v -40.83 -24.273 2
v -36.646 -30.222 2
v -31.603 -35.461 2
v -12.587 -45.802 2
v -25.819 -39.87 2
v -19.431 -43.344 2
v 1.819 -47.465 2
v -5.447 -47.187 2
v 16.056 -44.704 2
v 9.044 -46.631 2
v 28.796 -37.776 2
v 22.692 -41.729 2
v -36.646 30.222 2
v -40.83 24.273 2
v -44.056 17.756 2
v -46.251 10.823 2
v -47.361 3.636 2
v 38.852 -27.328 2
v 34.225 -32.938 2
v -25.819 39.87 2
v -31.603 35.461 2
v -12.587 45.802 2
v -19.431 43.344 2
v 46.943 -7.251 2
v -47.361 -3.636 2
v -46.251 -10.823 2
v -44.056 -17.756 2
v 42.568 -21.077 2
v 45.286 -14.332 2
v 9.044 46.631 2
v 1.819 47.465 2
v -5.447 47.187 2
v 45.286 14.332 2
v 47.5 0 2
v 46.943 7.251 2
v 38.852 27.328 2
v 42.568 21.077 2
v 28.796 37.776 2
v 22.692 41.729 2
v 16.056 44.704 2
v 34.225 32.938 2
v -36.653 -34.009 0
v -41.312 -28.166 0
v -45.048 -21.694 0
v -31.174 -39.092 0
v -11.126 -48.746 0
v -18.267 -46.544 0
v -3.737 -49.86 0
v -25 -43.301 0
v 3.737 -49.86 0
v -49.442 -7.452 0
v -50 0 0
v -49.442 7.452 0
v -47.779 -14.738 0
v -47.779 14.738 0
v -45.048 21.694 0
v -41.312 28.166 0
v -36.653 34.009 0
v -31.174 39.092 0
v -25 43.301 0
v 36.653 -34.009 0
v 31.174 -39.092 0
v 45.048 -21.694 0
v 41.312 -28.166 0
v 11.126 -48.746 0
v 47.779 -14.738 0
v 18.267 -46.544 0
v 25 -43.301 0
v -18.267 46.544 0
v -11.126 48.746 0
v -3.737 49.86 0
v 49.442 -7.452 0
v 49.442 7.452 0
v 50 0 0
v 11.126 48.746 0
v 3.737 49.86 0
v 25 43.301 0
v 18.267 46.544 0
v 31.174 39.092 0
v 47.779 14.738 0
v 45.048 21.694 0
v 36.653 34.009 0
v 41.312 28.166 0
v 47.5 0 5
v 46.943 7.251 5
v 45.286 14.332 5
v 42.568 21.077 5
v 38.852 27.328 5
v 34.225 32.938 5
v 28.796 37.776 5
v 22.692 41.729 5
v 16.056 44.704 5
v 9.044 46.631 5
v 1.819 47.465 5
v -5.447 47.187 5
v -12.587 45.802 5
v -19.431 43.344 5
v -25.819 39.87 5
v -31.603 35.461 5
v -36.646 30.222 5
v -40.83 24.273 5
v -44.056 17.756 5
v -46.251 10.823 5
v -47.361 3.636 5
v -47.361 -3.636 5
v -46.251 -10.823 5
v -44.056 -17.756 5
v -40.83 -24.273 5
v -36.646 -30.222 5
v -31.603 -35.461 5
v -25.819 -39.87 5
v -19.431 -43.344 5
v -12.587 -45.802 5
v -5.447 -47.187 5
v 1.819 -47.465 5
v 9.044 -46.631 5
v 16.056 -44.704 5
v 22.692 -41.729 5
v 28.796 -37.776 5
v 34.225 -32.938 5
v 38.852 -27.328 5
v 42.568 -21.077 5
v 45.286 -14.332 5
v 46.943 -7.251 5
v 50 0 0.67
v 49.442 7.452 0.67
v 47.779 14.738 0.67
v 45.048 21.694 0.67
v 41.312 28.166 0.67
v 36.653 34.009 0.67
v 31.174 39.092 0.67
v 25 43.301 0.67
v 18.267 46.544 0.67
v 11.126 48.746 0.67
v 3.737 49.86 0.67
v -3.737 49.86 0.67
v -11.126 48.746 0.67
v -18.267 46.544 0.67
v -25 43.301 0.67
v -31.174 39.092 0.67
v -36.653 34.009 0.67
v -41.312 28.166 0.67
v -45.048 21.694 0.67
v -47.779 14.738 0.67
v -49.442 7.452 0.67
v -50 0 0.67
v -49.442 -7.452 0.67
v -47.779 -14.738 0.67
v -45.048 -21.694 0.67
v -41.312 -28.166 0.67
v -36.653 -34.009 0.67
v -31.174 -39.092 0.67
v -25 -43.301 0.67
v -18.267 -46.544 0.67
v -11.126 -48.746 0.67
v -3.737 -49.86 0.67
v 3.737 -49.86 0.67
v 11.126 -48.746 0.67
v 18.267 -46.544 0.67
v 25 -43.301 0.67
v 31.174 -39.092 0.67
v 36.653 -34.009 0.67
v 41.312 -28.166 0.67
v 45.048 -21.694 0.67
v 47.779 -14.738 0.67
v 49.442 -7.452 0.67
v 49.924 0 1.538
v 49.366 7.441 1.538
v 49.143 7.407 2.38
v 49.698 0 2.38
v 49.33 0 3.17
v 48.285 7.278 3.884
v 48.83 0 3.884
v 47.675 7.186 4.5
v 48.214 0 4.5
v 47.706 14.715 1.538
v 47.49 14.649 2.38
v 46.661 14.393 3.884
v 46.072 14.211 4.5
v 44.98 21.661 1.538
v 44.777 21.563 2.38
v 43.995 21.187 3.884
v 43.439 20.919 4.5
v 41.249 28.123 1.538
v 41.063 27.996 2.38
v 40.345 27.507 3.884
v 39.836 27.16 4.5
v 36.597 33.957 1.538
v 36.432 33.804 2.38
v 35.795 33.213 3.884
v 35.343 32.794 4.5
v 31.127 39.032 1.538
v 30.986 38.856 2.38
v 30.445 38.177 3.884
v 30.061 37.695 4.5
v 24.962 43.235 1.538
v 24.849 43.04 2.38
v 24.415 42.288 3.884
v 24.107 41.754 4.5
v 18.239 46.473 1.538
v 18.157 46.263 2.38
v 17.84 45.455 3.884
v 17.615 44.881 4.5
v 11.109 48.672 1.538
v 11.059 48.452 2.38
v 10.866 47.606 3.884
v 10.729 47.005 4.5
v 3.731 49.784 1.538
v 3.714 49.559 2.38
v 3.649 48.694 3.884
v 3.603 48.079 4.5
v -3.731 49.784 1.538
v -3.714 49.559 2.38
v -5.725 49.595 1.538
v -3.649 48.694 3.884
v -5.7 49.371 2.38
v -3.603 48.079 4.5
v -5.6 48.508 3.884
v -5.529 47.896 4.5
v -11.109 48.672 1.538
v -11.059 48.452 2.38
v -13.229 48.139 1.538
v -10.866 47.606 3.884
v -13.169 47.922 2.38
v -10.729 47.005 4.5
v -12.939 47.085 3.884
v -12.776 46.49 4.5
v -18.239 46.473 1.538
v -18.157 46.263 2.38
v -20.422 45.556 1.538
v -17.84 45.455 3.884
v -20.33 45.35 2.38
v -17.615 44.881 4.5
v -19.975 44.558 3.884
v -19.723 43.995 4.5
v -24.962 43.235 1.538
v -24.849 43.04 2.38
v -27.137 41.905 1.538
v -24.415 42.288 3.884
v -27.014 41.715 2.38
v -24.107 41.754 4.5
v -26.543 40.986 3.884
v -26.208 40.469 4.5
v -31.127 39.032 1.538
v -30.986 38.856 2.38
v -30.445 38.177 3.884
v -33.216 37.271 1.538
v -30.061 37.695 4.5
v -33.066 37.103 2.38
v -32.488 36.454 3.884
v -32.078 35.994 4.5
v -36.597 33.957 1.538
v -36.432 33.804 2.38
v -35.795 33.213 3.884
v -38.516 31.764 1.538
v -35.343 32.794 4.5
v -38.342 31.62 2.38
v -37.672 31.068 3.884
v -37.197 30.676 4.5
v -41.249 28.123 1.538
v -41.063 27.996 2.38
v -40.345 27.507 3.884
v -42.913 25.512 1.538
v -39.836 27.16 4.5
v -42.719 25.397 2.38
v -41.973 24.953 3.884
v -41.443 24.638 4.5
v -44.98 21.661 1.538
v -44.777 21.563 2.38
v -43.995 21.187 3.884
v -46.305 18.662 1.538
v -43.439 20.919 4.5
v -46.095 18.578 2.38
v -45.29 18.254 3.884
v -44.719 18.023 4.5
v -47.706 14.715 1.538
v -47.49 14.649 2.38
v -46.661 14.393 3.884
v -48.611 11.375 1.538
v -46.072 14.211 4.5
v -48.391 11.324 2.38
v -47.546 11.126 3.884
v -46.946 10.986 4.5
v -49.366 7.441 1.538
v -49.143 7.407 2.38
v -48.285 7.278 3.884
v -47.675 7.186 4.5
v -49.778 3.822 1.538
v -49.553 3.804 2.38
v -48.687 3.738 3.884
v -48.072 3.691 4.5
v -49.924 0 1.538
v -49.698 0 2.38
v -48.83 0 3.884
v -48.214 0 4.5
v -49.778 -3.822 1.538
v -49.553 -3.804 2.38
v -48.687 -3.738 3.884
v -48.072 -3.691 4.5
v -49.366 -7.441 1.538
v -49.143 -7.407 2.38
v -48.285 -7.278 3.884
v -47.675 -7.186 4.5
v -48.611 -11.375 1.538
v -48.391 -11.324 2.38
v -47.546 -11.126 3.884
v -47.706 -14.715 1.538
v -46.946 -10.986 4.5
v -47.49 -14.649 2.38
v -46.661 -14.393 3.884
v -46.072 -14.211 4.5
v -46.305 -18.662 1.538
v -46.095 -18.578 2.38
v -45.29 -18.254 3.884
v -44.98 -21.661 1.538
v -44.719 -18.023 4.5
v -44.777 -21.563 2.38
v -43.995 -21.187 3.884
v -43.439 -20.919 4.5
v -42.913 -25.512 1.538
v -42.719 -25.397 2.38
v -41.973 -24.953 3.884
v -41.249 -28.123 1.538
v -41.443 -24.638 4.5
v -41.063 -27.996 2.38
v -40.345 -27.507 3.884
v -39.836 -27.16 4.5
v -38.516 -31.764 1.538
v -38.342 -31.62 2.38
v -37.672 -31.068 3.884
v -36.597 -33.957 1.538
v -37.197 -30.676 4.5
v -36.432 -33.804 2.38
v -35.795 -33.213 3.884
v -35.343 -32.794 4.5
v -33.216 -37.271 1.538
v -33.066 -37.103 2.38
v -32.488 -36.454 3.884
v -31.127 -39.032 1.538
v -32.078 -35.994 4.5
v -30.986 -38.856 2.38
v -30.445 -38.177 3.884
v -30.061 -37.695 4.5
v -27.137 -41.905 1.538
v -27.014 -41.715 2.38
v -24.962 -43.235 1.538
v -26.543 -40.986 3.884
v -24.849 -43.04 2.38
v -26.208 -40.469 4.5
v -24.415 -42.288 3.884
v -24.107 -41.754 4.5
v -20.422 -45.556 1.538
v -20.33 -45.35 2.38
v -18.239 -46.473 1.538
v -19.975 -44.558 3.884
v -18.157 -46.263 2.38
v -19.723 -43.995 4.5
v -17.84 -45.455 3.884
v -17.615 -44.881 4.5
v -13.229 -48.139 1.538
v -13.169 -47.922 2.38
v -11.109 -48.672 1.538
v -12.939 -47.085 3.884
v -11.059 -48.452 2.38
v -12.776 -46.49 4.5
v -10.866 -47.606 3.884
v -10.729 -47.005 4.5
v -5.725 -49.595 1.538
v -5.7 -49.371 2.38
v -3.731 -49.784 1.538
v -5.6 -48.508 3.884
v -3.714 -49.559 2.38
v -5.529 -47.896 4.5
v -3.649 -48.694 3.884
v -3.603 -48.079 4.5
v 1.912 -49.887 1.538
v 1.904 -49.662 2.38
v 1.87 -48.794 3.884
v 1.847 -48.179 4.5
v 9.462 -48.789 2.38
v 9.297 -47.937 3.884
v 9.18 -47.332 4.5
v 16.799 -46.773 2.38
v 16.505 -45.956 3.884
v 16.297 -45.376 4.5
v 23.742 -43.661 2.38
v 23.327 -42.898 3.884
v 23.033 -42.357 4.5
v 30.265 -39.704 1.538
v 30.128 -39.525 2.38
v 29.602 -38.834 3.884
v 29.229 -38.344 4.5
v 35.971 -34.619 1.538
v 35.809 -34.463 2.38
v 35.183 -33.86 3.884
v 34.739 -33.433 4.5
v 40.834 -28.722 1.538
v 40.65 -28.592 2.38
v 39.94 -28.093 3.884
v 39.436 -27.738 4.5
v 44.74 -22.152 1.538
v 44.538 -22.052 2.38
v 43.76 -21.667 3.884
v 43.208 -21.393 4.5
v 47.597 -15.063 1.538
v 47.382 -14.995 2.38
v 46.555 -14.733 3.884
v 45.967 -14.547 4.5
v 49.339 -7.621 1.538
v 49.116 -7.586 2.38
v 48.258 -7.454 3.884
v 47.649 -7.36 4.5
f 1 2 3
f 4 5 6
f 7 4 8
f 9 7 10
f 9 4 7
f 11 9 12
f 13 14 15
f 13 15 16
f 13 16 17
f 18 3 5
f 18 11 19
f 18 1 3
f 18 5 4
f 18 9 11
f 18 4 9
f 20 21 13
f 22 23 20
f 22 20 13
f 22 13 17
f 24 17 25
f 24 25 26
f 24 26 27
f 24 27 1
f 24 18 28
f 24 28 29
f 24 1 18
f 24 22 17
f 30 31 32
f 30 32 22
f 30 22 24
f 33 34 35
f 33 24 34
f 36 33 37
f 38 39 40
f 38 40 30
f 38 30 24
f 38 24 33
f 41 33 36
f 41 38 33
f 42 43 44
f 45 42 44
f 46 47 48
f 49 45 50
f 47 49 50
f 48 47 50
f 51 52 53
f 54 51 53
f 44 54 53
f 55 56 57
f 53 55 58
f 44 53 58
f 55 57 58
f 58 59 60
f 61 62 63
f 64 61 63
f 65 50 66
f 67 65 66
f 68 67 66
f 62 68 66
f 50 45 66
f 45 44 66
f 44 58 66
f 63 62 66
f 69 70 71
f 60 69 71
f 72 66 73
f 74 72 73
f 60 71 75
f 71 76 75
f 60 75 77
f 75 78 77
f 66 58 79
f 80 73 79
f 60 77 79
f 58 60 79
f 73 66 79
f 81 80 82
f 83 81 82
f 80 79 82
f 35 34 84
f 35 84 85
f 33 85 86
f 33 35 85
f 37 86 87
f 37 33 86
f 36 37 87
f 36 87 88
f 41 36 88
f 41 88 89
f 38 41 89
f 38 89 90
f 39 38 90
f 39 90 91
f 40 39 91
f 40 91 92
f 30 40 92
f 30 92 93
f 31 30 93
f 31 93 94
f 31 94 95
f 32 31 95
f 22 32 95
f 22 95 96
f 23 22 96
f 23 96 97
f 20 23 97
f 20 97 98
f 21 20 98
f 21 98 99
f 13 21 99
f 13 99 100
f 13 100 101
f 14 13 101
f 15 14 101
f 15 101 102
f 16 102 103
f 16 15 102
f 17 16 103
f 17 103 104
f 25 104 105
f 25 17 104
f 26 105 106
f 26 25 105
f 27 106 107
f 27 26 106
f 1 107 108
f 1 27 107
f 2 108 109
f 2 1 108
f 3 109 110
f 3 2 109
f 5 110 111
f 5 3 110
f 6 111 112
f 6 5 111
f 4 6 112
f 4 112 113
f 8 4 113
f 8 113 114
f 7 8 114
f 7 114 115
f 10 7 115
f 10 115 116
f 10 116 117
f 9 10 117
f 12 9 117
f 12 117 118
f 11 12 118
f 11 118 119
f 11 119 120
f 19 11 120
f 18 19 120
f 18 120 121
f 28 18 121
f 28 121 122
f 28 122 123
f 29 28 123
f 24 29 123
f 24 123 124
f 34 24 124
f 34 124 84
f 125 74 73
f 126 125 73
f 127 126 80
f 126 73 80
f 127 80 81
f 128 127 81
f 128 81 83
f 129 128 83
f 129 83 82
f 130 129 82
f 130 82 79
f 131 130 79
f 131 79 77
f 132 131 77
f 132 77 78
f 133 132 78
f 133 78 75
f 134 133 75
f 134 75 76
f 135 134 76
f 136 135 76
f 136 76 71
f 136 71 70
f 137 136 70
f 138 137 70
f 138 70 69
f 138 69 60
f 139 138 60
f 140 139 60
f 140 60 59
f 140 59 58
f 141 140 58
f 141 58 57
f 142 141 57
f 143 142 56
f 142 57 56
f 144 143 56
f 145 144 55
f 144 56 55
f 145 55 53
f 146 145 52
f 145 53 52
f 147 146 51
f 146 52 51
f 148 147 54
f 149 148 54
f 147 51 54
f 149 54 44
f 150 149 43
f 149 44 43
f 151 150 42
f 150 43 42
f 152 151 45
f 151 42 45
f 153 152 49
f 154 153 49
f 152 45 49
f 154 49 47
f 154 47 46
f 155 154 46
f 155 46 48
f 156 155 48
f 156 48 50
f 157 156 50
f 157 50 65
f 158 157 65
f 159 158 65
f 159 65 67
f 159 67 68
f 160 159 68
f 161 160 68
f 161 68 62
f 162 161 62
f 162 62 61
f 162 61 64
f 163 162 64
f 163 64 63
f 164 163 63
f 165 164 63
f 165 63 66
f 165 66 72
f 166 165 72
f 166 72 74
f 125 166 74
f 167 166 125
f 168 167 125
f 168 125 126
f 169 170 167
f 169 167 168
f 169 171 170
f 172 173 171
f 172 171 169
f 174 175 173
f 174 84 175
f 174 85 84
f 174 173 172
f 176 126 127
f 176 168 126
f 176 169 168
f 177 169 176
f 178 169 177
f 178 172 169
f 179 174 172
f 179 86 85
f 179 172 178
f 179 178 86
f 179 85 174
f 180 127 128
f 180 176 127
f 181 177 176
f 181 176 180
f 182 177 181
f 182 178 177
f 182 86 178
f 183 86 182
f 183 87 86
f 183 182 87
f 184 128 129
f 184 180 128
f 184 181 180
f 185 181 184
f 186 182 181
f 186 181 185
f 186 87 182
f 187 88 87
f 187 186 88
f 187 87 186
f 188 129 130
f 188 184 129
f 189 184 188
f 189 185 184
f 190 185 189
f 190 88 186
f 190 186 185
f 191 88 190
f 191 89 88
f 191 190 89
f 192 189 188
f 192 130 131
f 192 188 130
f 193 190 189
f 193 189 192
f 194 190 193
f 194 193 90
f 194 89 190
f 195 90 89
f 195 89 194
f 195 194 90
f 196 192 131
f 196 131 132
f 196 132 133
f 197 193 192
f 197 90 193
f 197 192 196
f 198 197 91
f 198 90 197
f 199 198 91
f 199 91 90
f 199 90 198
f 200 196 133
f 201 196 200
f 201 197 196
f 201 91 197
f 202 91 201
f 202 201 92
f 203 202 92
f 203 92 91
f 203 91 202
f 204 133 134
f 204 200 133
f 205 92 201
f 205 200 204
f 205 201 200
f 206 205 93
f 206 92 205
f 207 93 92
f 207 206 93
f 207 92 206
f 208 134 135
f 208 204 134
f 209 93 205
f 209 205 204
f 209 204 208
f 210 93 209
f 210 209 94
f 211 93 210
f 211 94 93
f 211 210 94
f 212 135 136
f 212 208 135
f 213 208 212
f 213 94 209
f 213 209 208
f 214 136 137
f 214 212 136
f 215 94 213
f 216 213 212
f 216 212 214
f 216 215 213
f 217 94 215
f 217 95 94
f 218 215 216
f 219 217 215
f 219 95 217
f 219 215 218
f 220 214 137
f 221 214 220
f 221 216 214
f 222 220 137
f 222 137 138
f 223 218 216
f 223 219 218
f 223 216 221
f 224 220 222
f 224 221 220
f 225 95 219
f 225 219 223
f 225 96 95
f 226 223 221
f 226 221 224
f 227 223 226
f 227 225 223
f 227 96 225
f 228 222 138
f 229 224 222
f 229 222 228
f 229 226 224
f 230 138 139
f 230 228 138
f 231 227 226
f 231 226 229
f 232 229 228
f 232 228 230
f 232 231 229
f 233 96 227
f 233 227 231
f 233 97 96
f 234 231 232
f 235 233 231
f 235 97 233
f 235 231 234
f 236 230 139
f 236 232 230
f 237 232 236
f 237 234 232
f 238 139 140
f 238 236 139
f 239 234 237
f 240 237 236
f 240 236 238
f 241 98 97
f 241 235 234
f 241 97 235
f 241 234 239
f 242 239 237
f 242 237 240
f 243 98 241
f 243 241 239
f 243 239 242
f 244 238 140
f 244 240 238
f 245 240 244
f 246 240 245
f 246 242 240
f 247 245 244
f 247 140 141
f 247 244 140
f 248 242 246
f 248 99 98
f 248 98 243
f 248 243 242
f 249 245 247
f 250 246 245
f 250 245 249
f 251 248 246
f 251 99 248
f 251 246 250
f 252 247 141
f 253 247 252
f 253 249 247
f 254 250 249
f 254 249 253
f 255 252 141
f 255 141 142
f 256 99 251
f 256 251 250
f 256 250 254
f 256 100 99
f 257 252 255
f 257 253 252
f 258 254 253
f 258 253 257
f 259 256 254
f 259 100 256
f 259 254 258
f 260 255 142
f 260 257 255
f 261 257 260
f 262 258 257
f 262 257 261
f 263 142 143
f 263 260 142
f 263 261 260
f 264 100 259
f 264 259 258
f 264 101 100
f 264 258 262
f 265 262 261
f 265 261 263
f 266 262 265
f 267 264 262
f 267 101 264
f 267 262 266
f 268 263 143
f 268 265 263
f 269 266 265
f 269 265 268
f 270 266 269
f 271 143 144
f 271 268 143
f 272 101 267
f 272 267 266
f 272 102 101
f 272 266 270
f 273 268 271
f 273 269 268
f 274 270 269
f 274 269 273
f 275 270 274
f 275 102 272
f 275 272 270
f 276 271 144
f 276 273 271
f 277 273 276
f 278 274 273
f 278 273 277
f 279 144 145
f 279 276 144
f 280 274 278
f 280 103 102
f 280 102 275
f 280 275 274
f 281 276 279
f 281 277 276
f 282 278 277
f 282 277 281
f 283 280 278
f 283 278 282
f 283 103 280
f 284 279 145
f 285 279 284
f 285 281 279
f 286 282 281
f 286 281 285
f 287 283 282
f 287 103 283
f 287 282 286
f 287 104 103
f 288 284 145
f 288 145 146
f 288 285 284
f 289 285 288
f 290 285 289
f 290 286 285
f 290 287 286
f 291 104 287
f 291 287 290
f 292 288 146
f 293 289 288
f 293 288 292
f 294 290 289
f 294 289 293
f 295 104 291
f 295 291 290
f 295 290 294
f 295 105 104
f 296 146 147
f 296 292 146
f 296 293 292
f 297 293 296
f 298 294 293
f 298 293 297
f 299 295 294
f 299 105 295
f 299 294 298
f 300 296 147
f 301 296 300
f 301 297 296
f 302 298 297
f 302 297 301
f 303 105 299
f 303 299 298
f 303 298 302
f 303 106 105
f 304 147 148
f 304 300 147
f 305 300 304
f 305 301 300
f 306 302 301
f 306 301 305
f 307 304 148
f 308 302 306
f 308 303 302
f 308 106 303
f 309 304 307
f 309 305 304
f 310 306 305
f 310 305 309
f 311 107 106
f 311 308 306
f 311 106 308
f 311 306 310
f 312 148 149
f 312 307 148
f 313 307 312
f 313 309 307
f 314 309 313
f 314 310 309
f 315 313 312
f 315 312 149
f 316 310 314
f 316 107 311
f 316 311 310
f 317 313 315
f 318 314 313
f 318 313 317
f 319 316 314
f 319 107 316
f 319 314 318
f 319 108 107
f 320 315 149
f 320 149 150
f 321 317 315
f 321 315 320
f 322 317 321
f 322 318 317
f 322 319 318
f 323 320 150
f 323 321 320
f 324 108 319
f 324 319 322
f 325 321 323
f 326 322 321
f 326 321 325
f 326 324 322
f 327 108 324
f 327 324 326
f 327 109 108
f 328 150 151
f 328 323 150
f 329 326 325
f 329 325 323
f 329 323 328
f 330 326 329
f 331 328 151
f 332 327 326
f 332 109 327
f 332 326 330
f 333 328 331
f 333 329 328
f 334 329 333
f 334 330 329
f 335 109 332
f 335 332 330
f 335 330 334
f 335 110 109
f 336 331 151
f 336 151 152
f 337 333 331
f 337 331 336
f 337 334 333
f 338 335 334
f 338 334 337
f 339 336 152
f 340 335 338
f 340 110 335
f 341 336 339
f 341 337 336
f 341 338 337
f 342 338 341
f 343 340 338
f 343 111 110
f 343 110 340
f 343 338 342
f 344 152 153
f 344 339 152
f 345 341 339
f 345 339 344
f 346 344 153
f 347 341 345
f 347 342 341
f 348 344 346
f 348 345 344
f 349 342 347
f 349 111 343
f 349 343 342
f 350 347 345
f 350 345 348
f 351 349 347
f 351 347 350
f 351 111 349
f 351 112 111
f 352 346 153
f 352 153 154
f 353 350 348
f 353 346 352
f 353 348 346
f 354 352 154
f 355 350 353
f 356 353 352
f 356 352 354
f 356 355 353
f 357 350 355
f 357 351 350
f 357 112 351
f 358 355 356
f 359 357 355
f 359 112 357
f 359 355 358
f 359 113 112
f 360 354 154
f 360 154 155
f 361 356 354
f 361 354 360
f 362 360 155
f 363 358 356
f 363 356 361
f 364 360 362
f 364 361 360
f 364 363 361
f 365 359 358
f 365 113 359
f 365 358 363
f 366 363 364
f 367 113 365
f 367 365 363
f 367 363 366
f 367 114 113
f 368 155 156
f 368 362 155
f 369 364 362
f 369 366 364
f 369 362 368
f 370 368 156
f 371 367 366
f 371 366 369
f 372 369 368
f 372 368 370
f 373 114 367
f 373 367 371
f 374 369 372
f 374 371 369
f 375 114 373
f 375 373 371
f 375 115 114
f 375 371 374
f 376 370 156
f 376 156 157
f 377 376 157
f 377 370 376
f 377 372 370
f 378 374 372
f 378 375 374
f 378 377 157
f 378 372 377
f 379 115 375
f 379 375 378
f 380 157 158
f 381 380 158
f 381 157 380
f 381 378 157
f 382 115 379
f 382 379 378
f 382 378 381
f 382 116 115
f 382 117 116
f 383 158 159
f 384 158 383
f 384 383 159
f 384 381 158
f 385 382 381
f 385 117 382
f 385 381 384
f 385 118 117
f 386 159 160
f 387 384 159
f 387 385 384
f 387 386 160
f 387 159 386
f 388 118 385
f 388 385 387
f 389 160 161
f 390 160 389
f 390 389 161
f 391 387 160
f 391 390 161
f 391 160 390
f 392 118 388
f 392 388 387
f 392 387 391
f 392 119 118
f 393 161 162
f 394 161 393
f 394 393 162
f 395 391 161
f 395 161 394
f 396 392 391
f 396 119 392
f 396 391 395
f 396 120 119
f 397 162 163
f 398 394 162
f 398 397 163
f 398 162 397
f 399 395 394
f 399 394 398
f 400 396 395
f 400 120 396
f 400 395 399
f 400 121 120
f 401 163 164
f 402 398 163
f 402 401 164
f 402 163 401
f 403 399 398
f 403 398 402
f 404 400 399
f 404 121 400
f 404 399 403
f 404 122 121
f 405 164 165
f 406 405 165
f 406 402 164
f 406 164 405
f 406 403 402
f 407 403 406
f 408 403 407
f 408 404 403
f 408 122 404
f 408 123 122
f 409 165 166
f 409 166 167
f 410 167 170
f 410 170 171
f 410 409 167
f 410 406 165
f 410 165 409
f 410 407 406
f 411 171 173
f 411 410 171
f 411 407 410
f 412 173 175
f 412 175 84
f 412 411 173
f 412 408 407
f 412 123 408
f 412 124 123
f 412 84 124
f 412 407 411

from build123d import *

# Parameters (mm, degrees)
F0_R     = 50
F0_R_2   = 47.5
F1_DEPTH = 5
F3_DEPTH = 2


# Not quite as in the source:
# - a fillet or chamfer that OpenCascade refuses, or shapes differently, is made with other operations: its cross-section is extruded or revolved along the edge and cut away or added


with BuildPart() as f1:
    # F0 (on Top) → F1 (new body)
    with BuildSketch(Plane.XY):
        Circle(F0_R)
        Circle(F0_R_2, mode=Mode.SUBTRACT)
    extrude(amount=F1_DEPTH)

    # F2: fillet of radius 5 on 1 edges, made by hand

    # F2_s1 → F2_t2 (revolve, cut)
    with BuildSketch(Plane.XZ):
        with BuildLine():
            ThreePointArc((50, 0.6698729811), (49.3301270189, 3.1698729811), (47.5, 5))
            Line((47.5, 5), (50, 5))
            Line((50, 5), (50, 0.6698729811))
        make_face()
    revolve(axis=Axis((0, 0, 5), (0, 0, 1)), mode=Mode.SUBTRACT)

    # F0 (on Top) → F3 (join)
    with BuildSketch(Plane.XY):
        Circle(F0_R_2)
    extrude(amount=F3_DEPTH)


solid = f1.part
